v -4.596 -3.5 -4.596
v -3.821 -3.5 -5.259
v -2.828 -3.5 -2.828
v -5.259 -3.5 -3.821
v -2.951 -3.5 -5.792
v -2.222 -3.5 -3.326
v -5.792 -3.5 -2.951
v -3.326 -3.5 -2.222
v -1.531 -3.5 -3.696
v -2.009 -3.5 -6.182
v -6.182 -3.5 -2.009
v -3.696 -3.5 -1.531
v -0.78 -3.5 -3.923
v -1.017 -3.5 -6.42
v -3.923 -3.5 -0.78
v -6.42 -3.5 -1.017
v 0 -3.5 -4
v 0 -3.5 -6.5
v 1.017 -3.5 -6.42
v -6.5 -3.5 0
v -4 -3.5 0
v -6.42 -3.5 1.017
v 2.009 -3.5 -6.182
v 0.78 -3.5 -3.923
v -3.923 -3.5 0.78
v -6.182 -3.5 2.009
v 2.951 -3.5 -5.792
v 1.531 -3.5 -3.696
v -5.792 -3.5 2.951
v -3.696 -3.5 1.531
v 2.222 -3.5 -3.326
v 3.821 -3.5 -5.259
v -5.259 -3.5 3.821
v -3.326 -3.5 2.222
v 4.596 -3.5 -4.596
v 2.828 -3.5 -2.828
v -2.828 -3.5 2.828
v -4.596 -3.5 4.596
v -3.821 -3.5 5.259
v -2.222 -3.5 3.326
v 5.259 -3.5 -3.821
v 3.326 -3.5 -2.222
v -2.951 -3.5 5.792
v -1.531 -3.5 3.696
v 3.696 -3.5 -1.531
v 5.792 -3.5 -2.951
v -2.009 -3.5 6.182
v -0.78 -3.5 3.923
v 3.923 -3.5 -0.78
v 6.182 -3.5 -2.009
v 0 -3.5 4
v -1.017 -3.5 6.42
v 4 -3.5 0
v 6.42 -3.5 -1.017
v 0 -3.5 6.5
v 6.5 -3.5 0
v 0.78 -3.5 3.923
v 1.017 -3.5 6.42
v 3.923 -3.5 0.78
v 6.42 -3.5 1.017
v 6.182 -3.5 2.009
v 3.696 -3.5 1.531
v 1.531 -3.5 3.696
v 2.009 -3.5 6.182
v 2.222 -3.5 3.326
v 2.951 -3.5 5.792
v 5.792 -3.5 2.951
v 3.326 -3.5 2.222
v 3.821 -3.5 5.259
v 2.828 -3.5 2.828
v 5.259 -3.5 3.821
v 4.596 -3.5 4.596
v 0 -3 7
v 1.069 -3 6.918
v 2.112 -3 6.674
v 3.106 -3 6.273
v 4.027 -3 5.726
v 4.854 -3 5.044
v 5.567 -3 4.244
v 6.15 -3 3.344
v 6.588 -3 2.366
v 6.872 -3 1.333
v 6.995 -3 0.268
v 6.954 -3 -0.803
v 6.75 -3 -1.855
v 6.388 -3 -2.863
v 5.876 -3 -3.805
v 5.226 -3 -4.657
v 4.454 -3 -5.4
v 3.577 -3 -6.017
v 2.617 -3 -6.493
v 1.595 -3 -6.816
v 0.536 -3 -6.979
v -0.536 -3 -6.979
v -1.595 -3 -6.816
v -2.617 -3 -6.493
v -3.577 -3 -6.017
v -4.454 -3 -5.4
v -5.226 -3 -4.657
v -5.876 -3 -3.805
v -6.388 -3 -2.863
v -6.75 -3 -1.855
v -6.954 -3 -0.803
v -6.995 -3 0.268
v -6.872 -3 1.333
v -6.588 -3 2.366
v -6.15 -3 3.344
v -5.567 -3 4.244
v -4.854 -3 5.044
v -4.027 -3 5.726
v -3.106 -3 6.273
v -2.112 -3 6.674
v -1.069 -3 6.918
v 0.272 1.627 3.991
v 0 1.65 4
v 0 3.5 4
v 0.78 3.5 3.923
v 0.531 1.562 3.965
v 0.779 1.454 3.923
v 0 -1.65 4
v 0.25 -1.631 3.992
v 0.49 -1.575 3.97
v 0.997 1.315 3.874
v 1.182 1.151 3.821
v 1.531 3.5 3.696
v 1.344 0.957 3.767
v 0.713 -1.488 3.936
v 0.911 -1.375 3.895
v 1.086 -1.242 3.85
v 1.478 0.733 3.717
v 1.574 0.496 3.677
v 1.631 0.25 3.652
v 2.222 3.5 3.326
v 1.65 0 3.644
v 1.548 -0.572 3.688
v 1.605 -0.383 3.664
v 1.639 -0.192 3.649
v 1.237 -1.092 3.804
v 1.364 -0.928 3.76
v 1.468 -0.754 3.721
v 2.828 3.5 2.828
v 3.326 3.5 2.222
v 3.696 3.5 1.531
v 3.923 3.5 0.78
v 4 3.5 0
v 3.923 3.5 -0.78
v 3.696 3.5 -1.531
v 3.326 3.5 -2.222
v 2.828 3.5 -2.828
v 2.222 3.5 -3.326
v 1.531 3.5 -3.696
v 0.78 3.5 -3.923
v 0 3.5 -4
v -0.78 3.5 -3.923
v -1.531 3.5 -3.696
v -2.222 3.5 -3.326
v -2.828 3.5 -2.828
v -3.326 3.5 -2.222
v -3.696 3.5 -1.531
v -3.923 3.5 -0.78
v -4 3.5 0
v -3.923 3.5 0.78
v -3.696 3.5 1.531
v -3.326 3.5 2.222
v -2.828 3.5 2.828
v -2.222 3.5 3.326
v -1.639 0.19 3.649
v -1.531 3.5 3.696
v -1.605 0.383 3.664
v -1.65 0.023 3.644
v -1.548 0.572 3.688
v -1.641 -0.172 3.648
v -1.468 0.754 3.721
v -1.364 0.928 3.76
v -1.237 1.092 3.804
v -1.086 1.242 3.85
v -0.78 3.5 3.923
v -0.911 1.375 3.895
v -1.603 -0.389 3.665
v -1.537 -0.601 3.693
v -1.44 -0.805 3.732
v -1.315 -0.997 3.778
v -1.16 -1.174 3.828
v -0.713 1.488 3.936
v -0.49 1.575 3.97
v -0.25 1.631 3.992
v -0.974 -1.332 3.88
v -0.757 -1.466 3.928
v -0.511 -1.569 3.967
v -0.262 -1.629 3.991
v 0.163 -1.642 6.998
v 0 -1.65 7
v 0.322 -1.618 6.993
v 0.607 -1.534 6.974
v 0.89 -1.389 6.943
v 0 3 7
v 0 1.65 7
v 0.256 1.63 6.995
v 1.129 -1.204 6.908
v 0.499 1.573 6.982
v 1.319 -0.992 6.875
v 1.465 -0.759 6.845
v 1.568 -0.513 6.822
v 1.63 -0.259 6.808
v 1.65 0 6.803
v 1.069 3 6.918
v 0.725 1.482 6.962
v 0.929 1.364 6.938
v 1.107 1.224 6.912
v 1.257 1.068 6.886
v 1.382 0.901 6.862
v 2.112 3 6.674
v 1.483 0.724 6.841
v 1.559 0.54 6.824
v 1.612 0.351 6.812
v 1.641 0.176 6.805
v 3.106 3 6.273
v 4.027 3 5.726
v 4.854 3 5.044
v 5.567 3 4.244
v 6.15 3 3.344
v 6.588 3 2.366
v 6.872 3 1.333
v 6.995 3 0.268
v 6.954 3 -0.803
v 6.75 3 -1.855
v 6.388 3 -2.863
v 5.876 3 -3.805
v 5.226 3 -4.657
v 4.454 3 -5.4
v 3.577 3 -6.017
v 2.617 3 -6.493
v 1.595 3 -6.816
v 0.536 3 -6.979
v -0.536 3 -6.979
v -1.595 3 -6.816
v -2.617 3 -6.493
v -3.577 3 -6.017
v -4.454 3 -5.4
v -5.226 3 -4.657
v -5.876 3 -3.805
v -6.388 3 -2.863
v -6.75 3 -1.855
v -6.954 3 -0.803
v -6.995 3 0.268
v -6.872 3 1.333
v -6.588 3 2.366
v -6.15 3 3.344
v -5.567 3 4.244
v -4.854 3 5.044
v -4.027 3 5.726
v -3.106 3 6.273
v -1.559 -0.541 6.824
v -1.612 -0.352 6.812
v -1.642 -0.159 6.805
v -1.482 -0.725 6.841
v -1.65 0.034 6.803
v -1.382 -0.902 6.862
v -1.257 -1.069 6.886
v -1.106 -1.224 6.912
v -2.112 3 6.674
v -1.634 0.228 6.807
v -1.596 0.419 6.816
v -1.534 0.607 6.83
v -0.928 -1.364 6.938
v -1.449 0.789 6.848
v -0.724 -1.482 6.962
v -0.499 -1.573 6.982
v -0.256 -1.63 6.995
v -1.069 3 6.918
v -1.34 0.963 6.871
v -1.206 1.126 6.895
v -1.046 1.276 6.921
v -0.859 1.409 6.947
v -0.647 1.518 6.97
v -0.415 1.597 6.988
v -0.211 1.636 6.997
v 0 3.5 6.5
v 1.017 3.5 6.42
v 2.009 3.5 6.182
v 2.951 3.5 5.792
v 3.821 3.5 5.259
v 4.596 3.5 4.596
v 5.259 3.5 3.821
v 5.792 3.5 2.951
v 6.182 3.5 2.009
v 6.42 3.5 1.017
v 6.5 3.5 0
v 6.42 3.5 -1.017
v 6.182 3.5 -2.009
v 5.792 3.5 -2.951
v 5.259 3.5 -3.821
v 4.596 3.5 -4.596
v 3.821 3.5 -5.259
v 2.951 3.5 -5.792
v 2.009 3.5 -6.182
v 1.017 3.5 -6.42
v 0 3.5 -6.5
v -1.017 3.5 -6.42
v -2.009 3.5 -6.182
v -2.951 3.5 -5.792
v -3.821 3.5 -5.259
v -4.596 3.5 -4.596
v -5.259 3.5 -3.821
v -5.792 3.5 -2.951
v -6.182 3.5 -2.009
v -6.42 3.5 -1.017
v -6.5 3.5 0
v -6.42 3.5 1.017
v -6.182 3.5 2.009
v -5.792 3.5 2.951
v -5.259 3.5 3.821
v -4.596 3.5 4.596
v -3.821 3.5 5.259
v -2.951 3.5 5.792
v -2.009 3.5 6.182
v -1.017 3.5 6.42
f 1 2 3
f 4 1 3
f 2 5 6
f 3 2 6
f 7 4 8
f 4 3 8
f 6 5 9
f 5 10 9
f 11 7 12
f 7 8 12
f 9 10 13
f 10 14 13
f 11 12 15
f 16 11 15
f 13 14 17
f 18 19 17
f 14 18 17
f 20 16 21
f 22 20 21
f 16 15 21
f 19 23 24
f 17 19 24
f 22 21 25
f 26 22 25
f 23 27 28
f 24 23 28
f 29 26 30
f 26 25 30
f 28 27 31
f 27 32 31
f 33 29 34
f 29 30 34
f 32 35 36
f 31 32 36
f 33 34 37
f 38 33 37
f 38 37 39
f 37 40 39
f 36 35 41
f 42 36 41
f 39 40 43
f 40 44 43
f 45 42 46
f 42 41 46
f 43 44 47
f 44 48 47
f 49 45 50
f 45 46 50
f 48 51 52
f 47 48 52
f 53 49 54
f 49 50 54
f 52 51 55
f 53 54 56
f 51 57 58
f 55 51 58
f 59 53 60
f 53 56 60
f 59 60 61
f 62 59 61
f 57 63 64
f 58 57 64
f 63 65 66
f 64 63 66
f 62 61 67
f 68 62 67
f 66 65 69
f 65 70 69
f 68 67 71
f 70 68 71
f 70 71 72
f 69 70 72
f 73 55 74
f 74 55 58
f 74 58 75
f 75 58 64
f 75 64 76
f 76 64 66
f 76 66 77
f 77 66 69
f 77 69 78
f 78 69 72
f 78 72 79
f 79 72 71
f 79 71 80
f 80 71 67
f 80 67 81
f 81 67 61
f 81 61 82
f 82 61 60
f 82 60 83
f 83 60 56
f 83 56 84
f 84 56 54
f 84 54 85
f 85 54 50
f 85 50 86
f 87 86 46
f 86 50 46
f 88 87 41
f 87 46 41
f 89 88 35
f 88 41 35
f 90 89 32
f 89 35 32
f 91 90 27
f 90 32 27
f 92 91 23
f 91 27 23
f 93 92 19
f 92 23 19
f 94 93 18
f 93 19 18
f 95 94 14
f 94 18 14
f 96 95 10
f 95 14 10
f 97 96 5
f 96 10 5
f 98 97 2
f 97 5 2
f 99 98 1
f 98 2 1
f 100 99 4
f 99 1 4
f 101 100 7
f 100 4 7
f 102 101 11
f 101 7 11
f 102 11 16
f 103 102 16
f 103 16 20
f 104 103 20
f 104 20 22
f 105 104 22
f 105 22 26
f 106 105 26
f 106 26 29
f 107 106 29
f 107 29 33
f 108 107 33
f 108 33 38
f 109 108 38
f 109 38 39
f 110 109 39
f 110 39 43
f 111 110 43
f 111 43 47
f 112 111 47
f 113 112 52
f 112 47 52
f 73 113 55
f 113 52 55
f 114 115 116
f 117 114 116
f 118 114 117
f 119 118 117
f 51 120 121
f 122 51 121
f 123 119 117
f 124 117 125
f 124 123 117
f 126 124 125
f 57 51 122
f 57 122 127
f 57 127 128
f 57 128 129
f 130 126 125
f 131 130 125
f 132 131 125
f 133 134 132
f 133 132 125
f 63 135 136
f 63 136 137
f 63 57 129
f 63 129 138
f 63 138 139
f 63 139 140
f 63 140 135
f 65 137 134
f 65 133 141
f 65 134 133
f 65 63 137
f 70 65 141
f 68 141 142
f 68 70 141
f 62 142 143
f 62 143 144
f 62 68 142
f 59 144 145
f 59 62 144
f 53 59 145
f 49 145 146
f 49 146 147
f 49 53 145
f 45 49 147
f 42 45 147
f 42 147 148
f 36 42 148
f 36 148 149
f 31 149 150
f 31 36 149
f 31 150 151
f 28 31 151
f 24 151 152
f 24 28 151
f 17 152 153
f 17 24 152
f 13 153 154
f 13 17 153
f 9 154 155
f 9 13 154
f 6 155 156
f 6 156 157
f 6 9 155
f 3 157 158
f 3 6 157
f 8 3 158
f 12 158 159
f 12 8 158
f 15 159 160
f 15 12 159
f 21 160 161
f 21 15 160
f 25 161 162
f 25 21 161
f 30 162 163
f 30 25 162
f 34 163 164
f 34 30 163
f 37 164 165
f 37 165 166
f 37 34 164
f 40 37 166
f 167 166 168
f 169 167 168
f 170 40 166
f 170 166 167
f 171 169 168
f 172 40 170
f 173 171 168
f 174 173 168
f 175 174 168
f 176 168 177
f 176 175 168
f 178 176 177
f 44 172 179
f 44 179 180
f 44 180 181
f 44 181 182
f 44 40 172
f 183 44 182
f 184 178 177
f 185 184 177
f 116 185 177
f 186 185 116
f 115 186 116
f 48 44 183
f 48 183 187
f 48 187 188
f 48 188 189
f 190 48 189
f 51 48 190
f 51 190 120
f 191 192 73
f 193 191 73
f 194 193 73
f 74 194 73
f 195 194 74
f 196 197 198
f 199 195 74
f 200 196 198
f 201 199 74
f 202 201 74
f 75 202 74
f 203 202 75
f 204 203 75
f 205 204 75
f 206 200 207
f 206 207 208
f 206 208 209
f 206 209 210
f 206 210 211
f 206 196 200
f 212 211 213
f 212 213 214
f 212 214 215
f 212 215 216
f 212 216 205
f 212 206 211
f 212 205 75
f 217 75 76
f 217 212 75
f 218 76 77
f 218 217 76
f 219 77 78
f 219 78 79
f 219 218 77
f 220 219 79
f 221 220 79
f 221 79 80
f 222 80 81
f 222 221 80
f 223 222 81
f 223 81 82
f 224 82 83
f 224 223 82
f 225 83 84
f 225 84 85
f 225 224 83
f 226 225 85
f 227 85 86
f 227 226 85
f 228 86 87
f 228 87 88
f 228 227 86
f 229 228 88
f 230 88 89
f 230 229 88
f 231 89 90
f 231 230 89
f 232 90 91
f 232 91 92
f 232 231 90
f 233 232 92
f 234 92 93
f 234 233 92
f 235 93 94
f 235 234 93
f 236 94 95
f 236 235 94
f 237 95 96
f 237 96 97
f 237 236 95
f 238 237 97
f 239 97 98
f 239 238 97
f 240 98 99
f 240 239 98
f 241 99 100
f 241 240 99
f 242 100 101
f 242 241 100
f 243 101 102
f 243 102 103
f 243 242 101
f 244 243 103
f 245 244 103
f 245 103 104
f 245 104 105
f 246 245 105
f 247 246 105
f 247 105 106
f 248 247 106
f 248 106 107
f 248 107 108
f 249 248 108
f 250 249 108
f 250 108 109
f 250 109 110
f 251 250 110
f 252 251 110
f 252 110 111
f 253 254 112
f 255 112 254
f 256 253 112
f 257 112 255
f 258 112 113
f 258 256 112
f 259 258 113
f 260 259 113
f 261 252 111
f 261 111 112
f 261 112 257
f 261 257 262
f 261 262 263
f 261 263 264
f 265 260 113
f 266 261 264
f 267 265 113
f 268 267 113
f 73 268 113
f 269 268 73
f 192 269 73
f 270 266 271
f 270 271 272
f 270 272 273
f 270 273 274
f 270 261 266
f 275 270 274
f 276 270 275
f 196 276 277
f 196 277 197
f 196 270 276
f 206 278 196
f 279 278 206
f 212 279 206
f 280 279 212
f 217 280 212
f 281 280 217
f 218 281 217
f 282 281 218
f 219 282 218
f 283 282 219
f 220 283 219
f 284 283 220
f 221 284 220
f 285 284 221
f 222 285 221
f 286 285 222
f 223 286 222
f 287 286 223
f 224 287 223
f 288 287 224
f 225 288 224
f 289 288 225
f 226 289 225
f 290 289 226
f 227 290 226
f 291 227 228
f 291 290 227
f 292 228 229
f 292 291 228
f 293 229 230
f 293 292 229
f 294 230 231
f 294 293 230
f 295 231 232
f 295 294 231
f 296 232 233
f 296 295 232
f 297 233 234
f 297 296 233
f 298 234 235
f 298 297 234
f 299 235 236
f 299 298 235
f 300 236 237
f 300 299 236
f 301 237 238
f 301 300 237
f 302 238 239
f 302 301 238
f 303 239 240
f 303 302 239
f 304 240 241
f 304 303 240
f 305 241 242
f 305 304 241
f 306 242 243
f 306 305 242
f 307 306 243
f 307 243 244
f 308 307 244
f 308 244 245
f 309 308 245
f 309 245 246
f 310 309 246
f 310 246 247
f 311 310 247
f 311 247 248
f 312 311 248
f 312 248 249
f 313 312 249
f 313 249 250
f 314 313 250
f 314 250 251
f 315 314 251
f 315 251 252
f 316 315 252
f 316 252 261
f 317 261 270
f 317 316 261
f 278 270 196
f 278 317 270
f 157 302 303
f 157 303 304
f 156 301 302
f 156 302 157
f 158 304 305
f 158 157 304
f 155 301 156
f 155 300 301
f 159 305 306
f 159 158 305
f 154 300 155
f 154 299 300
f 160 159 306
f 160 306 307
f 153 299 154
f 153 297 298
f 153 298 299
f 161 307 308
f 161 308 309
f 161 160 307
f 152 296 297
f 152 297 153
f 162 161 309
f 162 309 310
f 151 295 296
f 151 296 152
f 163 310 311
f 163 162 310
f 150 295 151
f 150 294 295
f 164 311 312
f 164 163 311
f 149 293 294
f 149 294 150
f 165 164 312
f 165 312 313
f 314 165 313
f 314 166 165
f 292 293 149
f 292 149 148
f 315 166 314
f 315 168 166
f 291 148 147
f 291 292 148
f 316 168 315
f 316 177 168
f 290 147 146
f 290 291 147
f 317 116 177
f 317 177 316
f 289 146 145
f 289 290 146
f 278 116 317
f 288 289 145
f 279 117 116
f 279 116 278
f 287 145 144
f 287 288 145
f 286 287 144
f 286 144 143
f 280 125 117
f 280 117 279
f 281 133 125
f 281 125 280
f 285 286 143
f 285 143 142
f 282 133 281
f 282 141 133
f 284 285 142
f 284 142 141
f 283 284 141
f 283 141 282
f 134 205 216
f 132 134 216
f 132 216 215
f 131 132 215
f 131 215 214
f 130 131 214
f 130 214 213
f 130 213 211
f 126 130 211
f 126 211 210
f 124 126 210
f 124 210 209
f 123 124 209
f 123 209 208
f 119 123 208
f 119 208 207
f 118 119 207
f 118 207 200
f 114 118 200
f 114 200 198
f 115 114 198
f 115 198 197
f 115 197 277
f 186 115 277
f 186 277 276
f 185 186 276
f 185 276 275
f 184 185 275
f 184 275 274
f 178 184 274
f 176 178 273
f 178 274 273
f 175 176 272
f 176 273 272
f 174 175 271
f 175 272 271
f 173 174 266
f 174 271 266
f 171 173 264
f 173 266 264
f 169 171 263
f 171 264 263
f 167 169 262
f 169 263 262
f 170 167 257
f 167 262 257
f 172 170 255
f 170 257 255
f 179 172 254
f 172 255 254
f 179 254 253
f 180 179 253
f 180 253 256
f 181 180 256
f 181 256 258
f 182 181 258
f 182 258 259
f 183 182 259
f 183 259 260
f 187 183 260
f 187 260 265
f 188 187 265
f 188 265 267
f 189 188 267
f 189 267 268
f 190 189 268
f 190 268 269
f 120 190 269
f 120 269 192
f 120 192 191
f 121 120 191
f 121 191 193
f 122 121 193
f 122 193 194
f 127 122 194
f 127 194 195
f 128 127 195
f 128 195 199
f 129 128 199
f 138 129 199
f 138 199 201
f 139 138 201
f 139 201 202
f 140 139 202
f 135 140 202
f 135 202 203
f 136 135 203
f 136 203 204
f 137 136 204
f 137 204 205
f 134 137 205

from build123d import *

# Parameters (mm, degrees)
SKETCH1_R                  = 7
SKETCH1_R_2                = 4
BOSS_EXTRUDE1_DEPTH        = 3.5
M4X0_7_TAPPED_HOLE1_REACH  = 18.039
M4X0_7_TAPPED_HOLE1_BORE_R = 1.65
CHAMFER1_SIZE              = 0.5


with BuildPart() as part:
    # Sketch1 → Boss-Extrude1 (new, symmetric)
    with BuildSketch(Plane(origin=(0, 0, 0), x_dir=(1, 0, 0), z_dir=(0, 1, 0))):
        with Locations(Location((0, 0, 0), (0, 0, 270))):
            Circle(SKETCH1_R)
        with Locations(Location((0, 0, 0), (0, 0, 270))):
            Circle(SKETCH1_R_2, mode=Mode.SUBTRACT)
    extrude(amount=BOSS_EXTRUDE1_DEPTH, both=True)

    # M4x0.7 Tapped Hole1 bore → M4x0.7 Tapped Hole1 (cut, up to next)
    with BuildSketch(Plane.XY.offset(7), mode=Mode.PRIVATE) as m4x0_7_tapped_hole1_sk1:
        Circle(M4X0_7_TAPPED_HOLE1_BORE_R)
    m4x0_7_tapped_hole1_tool1 = extrude(m4x0_7_tapped_hole1_sk1.sketch, amount=-M4X0_7_TAPPED_HOLE1_REACH, mode=Mode.PRIVATE) & part.part
    add(m4x0_7_tapped_hole1_tool1.solids().sort_by_distance((0, 0, 7))[0], mode=Mode.SUBTRACT)

    # Chamfer1
    chamfer1_edges = [part.edges().sort_by_distance(p)[0] for p in [
        (0, -3.5, -7),
        (0, 3.5, -7),
    ]]
    chamfer(chamfer1_edges, length=CHAMFER1_SIZE)


solid = part.part
